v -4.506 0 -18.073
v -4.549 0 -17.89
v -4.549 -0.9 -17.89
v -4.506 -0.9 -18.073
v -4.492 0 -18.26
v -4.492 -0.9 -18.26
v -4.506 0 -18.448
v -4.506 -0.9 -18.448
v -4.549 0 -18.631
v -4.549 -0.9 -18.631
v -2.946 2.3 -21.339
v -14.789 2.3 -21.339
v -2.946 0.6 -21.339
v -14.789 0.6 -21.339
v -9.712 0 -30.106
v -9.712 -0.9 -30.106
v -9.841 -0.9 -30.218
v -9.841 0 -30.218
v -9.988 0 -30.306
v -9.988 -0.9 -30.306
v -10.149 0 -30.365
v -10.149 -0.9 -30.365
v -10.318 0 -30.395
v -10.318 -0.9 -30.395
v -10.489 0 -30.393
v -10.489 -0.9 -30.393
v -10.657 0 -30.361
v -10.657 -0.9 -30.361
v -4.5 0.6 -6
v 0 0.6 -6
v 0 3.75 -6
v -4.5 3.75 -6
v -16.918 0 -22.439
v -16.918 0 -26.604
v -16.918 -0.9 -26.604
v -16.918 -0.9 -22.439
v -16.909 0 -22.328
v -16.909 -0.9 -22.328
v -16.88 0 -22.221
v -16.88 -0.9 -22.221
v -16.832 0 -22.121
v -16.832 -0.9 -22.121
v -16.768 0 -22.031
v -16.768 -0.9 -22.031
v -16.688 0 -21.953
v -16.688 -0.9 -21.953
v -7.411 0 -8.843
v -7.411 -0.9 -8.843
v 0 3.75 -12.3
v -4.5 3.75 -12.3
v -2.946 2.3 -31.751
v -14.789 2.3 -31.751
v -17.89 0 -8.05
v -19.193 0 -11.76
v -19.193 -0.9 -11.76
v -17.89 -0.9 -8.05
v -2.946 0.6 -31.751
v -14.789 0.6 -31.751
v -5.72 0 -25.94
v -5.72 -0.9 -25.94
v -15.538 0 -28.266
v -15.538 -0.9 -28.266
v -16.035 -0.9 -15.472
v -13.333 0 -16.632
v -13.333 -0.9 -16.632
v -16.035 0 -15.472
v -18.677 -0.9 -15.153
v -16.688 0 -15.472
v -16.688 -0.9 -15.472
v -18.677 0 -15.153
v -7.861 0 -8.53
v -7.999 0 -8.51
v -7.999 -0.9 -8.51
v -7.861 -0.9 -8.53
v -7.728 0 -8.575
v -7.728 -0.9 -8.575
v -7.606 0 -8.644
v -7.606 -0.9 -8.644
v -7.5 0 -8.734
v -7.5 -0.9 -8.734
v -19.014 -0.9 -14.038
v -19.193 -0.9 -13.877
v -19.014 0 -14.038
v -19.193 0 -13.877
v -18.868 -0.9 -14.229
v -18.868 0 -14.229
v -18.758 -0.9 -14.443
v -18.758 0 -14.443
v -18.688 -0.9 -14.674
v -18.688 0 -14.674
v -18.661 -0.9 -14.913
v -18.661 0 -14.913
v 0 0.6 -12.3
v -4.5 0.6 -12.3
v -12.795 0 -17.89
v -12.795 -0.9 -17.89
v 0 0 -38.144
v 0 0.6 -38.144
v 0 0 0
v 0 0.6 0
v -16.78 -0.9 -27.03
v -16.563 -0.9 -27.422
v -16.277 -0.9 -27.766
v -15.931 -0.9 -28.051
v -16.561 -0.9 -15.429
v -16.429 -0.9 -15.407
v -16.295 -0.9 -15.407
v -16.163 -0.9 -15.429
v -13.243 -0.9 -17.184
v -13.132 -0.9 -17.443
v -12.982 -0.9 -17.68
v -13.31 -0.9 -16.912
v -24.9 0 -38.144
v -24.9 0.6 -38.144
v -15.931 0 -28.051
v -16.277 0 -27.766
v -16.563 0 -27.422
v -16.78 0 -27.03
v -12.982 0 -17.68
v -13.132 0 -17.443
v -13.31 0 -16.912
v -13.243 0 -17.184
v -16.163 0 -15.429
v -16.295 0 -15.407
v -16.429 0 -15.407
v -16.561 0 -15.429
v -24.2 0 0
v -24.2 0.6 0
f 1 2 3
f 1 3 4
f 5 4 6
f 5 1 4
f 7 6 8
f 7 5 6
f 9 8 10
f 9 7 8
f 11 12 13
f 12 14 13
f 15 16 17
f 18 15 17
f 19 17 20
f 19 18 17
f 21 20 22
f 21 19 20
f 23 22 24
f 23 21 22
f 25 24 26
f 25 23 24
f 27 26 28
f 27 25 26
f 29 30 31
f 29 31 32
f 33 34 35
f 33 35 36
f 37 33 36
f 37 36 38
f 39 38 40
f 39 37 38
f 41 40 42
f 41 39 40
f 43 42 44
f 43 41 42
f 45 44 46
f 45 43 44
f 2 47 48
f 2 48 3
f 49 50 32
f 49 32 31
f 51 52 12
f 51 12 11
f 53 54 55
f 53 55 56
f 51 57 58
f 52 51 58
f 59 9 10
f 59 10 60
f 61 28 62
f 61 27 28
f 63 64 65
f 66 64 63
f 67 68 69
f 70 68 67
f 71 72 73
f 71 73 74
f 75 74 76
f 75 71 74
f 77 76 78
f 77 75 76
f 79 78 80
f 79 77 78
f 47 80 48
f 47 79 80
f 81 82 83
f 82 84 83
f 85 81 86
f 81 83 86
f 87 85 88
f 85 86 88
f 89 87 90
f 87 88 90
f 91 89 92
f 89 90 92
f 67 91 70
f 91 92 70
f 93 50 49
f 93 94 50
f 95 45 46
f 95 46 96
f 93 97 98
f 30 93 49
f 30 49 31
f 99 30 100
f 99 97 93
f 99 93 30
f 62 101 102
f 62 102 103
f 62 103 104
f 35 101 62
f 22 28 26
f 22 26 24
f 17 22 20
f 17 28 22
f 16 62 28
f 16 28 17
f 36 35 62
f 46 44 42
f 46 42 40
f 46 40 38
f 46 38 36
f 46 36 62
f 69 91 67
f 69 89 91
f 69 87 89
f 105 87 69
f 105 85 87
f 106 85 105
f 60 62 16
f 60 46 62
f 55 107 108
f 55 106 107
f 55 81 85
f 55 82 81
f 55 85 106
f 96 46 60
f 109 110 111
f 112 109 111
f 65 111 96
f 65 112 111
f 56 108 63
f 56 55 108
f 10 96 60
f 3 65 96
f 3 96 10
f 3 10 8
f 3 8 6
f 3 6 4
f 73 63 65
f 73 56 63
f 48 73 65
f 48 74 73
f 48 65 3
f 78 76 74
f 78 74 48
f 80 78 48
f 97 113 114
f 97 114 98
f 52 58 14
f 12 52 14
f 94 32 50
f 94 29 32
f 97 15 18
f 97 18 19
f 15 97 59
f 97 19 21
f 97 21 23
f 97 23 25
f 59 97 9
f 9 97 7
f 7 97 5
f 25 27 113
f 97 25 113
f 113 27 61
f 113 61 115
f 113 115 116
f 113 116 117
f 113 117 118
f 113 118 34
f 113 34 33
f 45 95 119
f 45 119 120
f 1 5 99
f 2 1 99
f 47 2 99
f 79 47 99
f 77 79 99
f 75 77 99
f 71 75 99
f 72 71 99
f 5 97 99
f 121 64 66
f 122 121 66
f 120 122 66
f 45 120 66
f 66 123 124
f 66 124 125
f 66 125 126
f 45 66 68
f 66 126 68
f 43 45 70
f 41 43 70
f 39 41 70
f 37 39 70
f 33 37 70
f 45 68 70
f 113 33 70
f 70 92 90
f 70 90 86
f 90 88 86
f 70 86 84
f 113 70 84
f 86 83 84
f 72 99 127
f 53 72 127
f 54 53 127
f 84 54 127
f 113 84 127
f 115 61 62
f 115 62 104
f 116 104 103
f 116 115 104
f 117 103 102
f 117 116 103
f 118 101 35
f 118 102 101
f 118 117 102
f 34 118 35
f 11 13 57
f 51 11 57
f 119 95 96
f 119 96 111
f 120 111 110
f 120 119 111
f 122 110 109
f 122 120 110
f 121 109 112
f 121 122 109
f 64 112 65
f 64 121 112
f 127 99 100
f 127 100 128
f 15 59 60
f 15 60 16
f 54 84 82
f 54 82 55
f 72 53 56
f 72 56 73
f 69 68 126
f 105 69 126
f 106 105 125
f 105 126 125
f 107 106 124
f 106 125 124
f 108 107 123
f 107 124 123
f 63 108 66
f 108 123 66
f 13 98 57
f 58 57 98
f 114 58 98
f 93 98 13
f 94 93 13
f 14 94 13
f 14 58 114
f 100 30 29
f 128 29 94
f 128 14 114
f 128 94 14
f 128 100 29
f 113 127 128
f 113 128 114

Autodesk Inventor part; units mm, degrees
ref_plane "YZ Plane" through (0, 0, 0) normal (1, 0, 0) x (0, 1, 0)
ref_plane "XZ Plane" through (0, 0, 0) normal (0, 1, 0) x (-1, 0, 0)
ref_plane "XY Plane" through (0, 0, 0) normal (0, 0, 1) x (1, 0, 0)
sketch "Sketch1" plane through (0, 0, 0) normal (0, 1, 0) x (-1, 0, 0)
  line L0 (0, 0) -> (24.2, 0)
  line L1 (24.2, 0) -> (24.9, -38.1436)
  line L2 (24.9, -38.1436) -> (0, -38.1436)
  line L3 (0, -38.1436) -> (0, 0)
  dimension "d0" = 38.15
  dimension "d1" = 24.9
  dimension "d2" = 24.2
extrude "Extrusion1" add sketch "Sketch1" along normal blind 0.6
sketch "Sketch2" plane through (0, 0.6, 0) normal (0, 1, 0) x (1, 0, 0)
  line L0 (0, 38.1436) -> (-24.9, 38.1436) projected
  line L1 (-24.9, 38.1436) -> (-24.2, 0) projected
  line L2 (-24.2, 0) -> (0, 0) projected
  line L3 (0, 0) -> (0, 38.1436) projected
  line L4 (0, 6) -> (-4.5, 6)
  line L5 (-4.5, 6) -> (-4.5, 12.3)
  line L6 (-4.5, 12.3) -> (0, 12.3)
  line L7 (0, 12.3) -> (0, 6)
  point P0 (0, 12.3)
  dimension "d5" = 4.5
  dimension "d6" = 6.3
  dimension "d7" = 6
  dimension "d8" = 25.8436
extrude "Extrusion2" add sketch "Sketch2" along normal blind 3.15 contours L3 L4 L5 L6
sketch "Sketch3" plane through (0, 0.6, 0) normal (0, 1, 0) x (1, 0, 0)
  line L0 (-14.7887, 21.3392) -> (-2.9463, 21.3392)
  line L1 (-2.9463, 21.3392) -> (-2.9463, 31.7514)
  line L2 (-2.9463, 31.7514) -> (-14.7887, 31.7514)
  line L3 (-14.7887, 31.7514) -> (-14.7887, 21.3392)
  point P0 (0, 0)
extrude "Extrusion3" add sketch "Sketch3" along normal blind 1.7
sketch "Sketch4" plane through (0, 0, 0) normal (0, -1, 0) x (1, 0, 0)
  line L0 (-17.8896, -8.0503) -> (-7.9992, -8.5103)
  arc A0 (-7.4114, -8.8426) -> (-7.9992, -8.5103) centre (-8.034, -9.258) ccw
  line L1 (-7.4114, -8.8426) -> (-4.5491, -17.8896)
  arc A1 (-4.5491, -18.6308) -> (-4.5491, -17.8896) centre (-5.7203, -18.2602) ccw
  line L2 (-4.5491, -18.6308) -> (-5.7203, -25.9399)
  arc A2 (-5.7203, -25.9399) -> (-5.7203, -25.9399) centre (-3.4138, -26.3096) ccw
  line L3 (-5.7203, -25.9399) -> (-9.7115, -30.1057)
  arc A3 (-10.6571, -30.3612) -> (-9.7115, -30.1057) centre (-10.3961, -29.4497) ccw
  line L4 (-10.6571, -30.3612) -> (-15.5384, -28.2656)
  arc A4 (-16.9185, -26.6044) -> (-15.5384, -28.2656) centre (-14.6016, -26.0835) ccw
  line L5 (-16.9185, -26.6044) -> (-16.9185, -22.4387)
  arc A5 (-16.6885, -21.9531) -> (-16.9185, -22.4387) centre (-16.2909, -22.4387) ccw
  line L6 (-16.6885, -21.9531) -> (-12.7952, -17.8896)
  arc A6 (-13.3329, -16.6318) -> (-12.7952, -17.8896) centre (-11.5884, -16.63) ccw
  line L7 (-13.3329, -16.6318) -> (-16.0354, -15.4715)
  arc A7 (-16.0354, -15.4715) -> (-16.6885, -15.4715) centre (-16.3619, -16.2321) ccw
  line L8 (-16.6885, -15.4715) -> (-18.6774, -15.1528)
  arc A8 (-18.6774, -15.1528) -> (-19.193, -13.8772) centre (-19.9919, -14.9421) ccw
  line L9 (-19.193, -13.8772) -> (-19.193, -11.7599)
  line L10 (-19.193, -11.7599) -> (-17.8896, -8.0503)
  point P0 (0, 0)
extrude "Extrusion4" add sketch "Sketch4" along normal blind 0.9 contours L0 A0 L1 A1 L2 L3 A3 L4 A4 L5 A5 L6 A6 L7 A7 L8 A8 L9 L10
properties part number "adc"
